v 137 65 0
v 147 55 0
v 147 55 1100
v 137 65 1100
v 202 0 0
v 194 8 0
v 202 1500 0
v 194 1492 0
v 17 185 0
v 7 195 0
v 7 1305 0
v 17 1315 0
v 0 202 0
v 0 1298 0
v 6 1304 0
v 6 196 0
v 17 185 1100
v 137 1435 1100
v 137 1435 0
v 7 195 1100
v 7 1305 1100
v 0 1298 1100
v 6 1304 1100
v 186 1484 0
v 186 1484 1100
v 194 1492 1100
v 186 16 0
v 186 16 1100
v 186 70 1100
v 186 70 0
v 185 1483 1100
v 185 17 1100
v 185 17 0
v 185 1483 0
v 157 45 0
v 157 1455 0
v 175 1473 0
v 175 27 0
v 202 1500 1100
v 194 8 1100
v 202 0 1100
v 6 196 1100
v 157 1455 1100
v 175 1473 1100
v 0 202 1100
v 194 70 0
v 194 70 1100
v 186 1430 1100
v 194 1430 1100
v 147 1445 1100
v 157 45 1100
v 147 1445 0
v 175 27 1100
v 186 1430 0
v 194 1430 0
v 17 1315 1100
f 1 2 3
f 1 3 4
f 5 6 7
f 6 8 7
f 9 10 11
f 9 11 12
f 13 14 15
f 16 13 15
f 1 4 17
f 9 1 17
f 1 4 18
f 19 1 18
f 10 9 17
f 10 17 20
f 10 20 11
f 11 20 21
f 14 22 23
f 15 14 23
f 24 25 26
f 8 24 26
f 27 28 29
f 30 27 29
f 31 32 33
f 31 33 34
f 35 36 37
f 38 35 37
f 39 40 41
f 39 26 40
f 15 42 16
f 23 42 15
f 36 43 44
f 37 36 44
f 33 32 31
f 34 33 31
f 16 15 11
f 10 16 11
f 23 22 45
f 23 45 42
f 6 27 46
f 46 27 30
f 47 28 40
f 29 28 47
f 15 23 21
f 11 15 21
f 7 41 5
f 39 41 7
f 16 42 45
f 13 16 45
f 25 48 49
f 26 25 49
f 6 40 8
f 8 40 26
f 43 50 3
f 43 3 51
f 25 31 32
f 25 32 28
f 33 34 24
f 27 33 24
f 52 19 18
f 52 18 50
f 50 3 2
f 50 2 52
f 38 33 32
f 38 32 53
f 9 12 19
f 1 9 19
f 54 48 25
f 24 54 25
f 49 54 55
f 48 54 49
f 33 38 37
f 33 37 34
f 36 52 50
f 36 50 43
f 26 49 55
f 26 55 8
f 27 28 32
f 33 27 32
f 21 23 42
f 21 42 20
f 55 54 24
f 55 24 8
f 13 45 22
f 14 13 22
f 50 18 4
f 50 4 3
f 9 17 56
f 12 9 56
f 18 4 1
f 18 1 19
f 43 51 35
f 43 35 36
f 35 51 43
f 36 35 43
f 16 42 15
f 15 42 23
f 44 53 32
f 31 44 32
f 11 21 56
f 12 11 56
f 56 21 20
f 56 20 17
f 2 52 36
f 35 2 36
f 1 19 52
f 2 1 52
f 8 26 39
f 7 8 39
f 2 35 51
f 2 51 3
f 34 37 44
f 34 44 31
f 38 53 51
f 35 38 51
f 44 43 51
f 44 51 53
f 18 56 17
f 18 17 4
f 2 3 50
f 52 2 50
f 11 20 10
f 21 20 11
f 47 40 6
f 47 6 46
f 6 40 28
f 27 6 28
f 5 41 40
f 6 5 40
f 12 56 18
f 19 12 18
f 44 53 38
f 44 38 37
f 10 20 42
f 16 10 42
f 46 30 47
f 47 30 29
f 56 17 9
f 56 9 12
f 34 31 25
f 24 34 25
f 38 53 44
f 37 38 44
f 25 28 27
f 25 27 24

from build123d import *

# Parameters (mm, degrees)
F0_W      = 1500
F0_H      = 1100
F1_DEPTH  = 6
F2_DEPTH  = 1
F3_DEPTH  = 10
F4_DEPTH  = 120
F5_DEPTH  = 10
F6_DEPTH  = 10
F7_DEPTH  = 18
F8_DEPTH  = 10
F9_DEPTH  = 1
F10_W     = 70
F10_H     = 1100
F11_DEPTH = 8
F12_W     = 1500
F12_H     = 1100
F13_DEPTH = 8
F15_DEPTH = 1100.001


with BuildPart() as f1:
    # F0 (on Right) → F1 (new body)
    with BuildSketch(Plane.YZ):
        with Locations((750, 550)):
            Rectangle(F0_W, F0_H)
    extrude(amount=F1_DEPTH)


with BuildPart() as f2:
    # F2 (new): a face of the model
    f2_faces = [f1.part.faces().sort_by_distance(p)[0] for p in [
        (6, 750, 550),
    ]]
    extrude(f2_faces, amount=F2_DEPTH)


with BuildPart() as f3:
    # F3 (new): a face of the model
    f3_faces = [f2.part.faces().sort_by_distance(p)[0] for p in [
        (7, 750, 550),
    ]]
    extrude(f3_faces, amount=F3_DEPTH)


with BuildPart() as f4:
    # F4 (new): a face of the model
    f4_faces = [f3.part.faces().sort_by_distance(p)[0] for p in [
        (17, 750, 550),
    ]]
    extrude(f4_faces, amount=F4_DEPTH)


with BuildPart() as f5:
    # F5 (new): a face of the model
    f5_faces = [f4.part.faces().sort_by_distance(p)[0] for p in [
        (137, 750, 550),
    ]]
    extrude(f5_faces, amount=F5_DEPTH)


with BuildPart() as f6:
    # F6 (new): a face of the model
    f6_faces = [f5.part.faces().sort_by_distance(p)[0] for p in [
        (147, 750, 550),
    ]]
    extrude(f6_faces, amount=F6_DEPTH)


with BuildPart() as f7:
    # F7 (new): a face of the model
    f7_faces = [f6.part.faces().sort_by_distance(p)[0] for p in [
        (157, 750, 550),
    ]]
    extrude(f7_faces, amount=F7_DEPTH)


with BuildPart() as f8:
    # F8 (new): a face of the model
    f8_faces = [f7.part.faces().sort_by_distance(p)[0] for p in [
        (175, 750, 550),
    ]]
    extrude(f8_faces, amount=F8_DEPTH)


with BuildPart() as f9:
    # F9 (new): a face of the model
    f9_faces = [f8.part.faces().sort_by_distance(p)[0] for p in [
        (185, 750, 550),
    ]]
    extrude(f9_faces, amount=F9_DEPTH)


with BuildPart() as f11:
    # F10 (on face) → F11 (new body)
    with BuildSketch(Plane.YZ.offset(186)):
        with Locations((35, 550)):
            Rectangle(F10_W, F10_H)
    extrude(amount=F11_DEPTH)


with BuildPart() as f11b:
    # F10 (on face) → F11, piece 2 (new body)
    with BuildSketch(Plane.YZ.offset(186)):
        with Locations((1465, 550)):
            Rectangle(F10_W, F10_H)
    extrude(amount=F11_DEPTH)


with BuildPart() as f13:
    # F12 (on face) → F13 (new body)
    with BuildSketch(Plane.YZ.offset(194)):
        with Locations((750, 550)):
            Rectangle(F12_W, F12_H)
    extrude(amount=F13_DEPTH)


with BuildPart() as f15_tool:
    # F14 (on face) → F15 (new body, through all)
    with BuildSketch(Plane.XY.offset(1100)):
        Polygon((0, 1298), (202, 1500), (0, 1500), align=None)
        Polygon((202, 0), (0, 202), (0, 0), align=None)
    extrude(amount=-F15_DEPTH)


with BuildPart() as f1_1:
    add(f1.part)

    # F15: cut by f15_tool
    add(f15_tool.part, mode=Mode.SUBTRACT)


with BuildPart() as f2_1:
    add(f2.part)

    # F15: cut by f15_tool
    add(f15_tool.part, mode=Mode.SUBTRACT)


with BuildPart() as f3_1:
    add(f3.part)

    # F15: cut by f15_tool
    add(f15_tool.part, mode=Mode.SUBTRACT)


with BuildPart() as f4_1:
    add(f4.part)

    # F15: cut by f15_tool
    add(f15_tool.part, mode=Mode.SUBTRACT)


with BuildPart() as f5_1:
    add(f5.part)

    # F15: cut by f15_tool
    add(f15_tool.part, mode=Mode.SUBTRACT)


with BuildPart() as f6_1:
    add(f6.part)

    # F15: cut by f15_tool
    add(f15_tool.part, mode=Mode.SUBTRACT)


with BuildPart() as f7_1:
    add(f7.part)

    # F15: cut by f15_tool
    add(f15_tool.part, mode=Mode.SUBTRACT)


with BuildPart() as f8_1:
    add(f8.part)

    # F15: cut by f15_tool
    add(f15_tool.part, mode=Mode.SUBTRACT)


with BuildPart() as f9_1:
    add(f9.part)

    # F15: cut by f15_tool
    add(f15_tool.part, mode=Mode.SUBTRACT)


with BuildPart() as f11_1:
    add(f11.part)

    # F15: cut by f15_tool
    add(f15_tool.part, mode=Mode.SUBTRACT)


with BuildPart() as f11b_1:
    add(f11b.part)

    # F15: cut by f15_tool
    add(f15_tool.part, mode=Mode.SUBTRACT)


with BuildPart() as f13_1:
    add(f13.part)

    # F15: cut by f15_tool
    add(f15_tool.part, mode=Mode.SUBTRACT)


solid = Compound([f1_1.part, f2_1.part, f3_1.part, f4_1.part, f5_1.part, f6_1.part, f7_1.part, f8_1.part, f9_1.part, f11_1.part, f11b_1.part, f13_1.part])
